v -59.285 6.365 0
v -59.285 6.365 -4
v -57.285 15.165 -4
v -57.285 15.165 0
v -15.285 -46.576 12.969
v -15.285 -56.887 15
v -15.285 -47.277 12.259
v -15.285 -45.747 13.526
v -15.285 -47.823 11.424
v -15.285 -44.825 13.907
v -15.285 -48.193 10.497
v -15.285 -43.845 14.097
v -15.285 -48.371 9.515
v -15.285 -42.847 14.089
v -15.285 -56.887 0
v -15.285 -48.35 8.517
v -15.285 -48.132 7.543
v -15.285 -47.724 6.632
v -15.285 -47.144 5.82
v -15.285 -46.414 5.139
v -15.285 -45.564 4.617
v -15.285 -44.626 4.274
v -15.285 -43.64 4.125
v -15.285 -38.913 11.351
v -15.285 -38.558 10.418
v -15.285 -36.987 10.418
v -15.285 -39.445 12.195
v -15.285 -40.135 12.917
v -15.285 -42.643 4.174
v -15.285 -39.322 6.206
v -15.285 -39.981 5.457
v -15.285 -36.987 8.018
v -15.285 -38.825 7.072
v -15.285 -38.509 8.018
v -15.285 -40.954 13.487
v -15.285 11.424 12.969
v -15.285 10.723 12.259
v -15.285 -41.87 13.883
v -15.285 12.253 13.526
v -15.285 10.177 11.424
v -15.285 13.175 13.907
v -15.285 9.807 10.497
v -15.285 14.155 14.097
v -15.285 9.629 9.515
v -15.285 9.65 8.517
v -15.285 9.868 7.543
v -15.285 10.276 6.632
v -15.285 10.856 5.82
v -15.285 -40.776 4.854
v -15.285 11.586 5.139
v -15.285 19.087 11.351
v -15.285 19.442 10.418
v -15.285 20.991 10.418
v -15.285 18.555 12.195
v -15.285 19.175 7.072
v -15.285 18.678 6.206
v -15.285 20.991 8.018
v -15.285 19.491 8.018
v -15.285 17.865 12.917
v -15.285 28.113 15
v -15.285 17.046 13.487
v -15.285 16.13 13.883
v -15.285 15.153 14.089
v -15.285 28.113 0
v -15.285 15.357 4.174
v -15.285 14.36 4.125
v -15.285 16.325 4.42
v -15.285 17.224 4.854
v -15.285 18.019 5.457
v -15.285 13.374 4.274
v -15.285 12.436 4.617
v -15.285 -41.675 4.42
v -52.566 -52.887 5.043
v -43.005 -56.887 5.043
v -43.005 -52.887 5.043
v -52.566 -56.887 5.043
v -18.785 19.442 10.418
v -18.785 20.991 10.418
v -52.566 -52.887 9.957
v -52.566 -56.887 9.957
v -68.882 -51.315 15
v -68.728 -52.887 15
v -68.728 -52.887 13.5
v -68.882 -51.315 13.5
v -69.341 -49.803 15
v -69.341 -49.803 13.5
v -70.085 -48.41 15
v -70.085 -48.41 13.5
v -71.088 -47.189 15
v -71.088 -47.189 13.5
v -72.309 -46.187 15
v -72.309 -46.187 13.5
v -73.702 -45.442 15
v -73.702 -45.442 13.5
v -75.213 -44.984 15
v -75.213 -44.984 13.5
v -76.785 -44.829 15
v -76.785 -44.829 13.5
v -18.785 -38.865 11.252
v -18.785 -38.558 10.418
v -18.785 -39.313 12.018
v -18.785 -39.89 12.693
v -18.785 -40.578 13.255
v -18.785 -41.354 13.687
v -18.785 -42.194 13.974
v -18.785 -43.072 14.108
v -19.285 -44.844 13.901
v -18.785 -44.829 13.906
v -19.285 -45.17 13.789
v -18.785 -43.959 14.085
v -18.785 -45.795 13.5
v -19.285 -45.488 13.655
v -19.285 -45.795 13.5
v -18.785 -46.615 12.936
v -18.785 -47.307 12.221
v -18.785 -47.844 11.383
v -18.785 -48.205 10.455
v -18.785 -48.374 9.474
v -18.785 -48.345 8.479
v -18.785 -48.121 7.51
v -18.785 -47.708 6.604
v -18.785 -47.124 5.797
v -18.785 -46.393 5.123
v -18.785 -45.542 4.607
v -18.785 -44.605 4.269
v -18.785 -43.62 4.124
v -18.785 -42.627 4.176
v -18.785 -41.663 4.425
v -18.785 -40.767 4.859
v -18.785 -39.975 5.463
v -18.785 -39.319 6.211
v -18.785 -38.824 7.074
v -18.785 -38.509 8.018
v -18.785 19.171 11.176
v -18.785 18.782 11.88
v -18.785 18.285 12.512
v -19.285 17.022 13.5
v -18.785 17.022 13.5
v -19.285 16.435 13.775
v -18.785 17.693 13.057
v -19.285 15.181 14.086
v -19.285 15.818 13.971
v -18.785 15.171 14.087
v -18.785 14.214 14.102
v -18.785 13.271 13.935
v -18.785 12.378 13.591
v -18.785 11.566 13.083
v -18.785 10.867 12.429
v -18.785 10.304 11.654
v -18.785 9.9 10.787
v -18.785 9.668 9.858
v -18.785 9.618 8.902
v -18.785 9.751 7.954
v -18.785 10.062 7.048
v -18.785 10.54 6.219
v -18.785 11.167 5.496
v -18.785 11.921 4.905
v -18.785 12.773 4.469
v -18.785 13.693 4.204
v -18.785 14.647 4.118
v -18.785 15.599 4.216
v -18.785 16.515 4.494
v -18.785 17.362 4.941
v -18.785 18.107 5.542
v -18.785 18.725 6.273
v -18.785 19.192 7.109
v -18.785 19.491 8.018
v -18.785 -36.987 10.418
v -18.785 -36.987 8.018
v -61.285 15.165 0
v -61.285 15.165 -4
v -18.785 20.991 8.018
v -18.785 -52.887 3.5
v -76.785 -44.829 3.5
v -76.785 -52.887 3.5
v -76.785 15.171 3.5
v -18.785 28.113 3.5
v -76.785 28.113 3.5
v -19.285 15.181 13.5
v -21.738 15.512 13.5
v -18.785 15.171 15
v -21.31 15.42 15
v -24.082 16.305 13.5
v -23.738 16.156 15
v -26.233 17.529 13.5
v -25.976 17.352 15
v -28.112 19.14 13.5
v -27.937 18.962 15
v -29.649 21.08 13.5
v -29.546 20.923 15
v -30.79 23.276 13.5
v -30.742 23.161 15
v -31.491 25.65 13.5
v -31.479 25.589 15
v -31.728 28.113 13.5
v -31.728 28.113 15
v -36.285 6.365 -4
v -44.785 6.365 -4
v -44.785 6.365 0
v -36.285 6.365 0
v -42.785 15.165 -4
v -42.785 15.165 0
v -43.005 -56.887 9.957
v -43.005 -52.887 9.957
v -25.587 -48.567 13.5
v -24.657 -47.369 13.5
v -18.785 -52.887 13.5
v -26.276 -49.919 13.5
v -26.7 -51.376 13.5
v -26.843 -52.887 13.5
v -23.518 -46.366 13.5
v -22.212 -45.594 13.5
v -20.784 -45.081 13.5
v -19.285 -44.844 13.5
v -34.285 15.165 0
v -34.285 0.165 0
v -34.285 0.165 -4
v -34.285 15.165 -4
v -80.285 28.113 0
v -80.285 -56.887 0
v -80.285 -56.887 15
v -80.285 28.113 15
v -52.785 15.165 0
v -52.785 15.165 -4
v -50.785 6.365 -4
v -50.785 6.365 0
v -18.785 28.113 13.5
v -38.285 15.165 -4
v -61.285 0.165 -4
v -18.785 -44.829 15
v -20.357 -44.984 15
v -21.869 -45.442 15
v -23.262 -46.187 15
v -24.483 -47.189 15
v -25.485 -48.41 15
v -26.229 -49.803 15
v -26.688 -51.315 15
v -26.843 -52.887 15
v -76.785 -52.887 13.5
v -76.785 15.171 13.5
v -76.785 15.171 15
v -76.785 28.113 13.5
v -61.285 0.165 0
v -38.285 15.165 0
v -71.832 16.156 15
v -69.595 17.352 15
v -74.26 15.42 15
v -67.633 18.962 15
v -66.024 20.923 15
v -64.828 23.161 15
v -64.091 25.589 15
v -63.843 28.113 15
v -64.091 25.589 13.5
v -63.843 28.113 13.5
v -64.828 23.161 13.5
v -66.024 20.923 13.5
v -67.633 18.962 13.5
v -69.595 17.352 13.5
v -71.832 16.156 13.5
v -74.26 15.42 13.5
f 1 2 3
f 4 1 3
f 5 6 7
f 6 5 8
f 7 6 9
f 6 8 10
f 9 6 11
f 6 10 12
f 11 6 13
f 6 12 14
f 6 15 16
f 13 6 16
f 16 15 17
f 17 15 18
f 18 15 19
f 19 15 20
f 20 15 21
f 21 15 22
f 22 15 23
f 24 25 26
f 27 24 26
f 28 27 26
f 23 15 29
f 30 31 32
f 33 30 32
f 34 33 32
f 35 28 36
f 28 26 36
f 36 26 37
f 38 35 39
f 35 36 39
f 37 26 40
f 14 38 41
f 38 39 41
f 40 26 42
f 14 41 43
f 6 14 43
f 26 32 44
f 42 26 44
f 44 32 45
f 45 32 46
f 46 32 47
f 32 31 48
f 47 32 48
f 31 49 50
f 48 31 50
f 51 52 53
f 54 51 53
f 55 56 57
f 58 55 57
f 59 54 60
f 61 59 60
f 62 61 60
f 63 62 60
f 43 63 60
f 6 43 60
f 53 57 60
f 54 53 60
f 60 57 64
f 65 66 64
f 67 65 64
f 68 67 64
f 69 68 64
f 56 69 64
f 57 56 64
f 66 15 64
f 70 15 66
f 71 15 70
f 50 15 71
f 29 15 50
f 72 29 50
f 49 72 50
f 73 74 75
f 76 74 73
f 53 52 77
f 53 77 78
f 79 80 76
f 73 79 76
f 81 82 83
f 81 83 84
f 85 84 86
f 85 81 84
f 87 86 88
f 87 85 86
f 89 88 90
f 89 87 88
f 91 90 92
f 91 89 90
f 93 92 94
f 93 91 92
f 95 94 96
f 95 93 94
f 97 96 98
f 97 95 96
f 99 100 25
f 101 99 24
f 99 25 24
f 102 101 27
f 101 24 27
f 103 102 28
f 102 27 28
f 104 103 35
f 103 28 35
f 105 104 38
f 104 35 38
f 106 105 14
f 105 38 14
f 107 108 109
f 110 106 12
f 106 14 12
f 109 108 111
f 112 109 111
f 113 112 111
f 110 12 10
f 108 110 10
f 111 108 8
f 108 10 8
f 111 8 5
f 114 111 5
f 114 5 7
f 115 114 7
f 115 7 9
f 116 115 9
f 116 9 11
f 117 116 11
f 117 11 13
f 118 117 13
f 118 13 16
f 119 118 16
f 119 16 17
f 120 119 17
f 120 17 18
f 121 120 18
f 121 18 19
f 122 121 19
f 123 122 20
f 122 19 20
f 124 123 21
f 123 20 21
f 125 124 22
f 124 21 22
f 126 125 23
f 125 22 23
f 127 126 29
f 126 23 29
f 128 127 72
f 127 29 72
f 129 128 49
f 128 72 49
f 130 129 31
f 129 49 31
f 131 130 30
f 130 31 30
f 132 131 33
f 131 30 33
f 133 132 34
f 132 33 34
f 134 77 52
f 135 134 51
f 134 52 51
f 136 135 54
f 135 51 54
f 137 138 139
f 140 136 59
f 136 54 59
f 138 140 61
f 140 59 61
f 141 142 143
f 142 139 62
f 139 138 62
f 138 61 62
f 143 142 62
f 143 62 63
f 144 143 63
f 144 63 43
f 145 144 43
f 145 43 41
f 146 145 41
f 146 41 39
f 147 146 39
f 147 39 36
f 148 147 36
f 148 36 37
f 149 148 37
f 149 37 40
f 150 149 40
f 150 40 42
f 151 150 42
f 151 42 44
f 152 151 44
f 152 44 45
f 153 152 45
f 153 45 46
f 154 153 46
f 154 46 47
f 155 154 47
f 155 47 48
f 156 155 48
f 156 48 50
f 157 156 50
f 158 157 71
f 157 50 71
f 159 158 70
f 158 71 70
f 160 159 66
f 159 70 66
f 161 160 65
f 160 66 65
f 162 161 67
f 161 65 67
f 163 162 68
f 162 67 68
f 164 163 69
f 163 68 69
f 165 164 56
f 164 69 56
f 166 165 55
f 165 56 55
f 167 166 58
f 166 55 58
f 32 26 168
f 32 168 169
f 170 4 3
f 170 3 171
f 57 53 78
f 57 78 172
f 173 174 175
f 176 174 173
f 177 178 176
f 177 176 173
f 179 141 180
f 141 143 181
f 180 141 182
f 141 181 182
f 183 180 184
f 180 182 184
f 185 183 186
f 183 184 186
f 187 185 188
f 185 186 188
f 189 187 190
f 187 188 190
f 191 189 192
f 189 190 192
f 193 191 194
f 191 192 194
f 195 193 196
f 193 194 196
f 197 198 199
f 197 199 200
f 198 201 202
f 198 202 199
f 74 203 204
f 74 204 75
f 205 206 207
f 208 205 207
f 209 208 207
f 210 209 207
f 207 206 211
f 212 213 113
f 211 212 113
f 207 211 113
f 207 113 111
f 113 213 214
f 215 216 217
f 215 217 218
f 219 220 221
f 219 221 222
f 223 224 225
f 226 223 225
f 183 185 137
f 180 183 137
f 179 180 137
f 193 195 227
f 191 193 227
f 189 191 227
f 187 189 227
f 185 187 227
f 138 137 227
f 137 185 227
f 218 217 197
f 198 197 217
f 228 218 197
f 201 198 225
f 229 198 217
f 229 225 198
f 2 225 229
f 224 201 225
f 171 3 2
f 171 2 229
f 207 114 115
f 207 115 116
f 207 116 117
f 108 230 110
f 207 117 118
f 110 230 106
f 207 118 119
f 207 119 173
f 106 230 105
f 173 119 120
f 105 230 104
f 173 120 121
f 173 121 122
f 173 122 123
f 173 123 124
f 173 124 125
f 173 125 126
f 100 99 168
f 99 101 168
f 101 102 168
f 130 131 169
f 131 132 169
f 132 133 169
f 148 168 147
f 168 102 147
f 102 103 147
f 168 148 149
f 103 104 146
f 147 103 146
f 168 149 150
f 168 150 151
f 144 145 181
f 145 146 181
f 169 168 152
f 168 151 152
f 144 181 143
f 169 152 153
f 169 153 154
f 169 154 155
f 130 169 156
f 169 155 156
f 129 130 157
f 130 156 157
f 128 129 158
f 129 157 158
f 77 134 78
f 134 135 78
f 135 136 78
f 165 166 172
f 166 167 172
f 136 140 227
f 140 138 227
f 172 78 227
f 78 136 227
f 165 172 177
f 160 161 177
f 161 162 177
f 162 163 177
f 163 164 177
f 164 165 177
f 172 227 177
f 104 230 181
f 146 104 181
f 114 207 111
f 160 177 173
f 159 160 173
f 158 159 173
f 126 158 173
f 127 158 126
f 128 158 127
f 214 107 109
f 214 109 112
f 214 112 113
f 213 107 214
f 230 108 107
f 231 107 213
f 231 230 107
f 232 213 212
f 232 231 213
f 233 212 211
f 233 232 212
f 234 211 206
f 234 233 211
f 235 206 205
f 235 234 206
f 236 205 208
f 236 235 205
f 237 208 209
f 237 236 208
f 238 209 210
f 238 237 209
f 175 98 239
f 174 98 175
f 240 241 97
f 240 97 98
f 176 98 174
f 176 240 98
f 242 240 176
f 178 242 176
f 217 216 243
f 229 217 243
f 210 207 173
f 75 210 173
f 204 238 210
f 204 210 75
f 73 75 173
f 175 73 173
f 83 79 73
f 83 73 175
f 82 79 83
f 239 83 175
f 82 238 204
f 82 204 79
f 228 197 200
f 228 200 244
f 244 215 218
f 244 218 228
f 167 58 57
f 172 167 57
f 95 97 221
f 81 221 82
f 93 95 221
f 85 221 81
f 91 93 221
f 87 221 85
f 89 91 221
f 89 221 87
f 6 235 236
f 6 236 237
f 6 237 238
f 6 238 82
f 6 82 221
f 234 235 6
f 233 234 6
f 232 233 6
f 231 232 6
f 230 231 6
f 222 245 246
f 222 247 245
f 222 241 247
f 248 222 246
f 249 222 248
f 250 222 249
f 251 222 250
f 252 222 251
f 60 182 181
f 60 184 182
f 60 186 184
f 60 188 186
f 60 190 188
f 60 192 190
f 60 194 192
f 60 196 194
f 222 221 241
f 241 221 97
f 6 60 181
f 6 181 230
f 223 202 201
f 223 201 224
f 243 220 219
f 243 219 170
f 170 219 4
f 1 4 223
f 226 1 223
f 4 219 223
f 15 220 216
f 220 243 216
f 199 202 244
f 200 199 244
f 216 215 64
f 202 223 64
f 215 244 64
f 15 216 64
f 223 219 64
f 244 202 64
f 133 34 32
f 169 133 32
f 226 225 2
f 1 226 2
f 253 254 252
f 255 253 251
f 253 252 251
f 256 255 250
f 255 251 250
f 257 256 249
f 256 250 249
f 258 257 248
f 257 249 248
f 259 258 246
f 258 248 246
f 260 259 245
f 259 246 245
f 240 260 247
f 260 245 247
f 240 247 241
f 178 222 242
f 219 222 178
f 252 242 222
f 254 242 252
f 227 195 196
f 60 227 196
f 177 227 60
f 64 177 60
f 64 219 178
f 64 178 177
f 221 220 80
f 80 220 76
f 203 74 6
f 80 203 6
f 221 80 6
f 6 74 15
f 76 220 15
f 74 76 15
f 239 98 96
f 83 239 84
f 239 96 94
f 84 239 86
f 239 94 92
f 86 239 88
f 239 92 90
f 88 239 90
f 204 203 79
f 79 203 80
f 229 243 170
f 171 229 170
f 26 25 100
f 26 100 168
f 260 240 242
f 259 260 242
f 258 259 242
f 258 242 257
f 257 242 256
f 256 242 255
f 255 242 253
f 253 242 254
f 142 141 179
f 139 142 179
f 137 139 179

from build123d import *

# Parameters (mm, degrees)
ESQUISSE1_W             = 65
ESQUISSE1_H             = 85
BOSS_EXTRU_1_DEPTH      = 15
ESQUISSE2_W             = 58
ESQUISSE2_H             = 60
ENL_V_MAT_EXTRU_1_DEPTH = 11.5
ENL_V_MAT_EXTRU_2_DEPTH = 11.5
ESQUISSE5_W             = 12.942434053
ESQUISSE5_H             = 10
ENL_V_MAT_EXTRU_4_DEPTH = 81
ESQUISSE6_W             = 12.942434052
ESQUISSE6_H             = 10
ENL_V_MAT_EXTRU_5_DEPTH = 81
ESQUISSE7_W             = 9.561184164
ESQUISSE7_H             = 4.914624062
ENL_V_MAT_EXTRU_6_DEPTH = 81
ESQUISSE9_W             = 27
ESQUISSE9_H             = 15
BOSS_EXTRU_3_DEPTH      = 4
ENL_V_MAT_EXTRU_8_DEPTH = 4
ESQUISSE13_R            = 5
ESQUISSE13_W            = 2.4
ESQUISSE13_H            = 6.4
ENL_V_MAT_EXTRU_9_DEPTH = 4


with BuildPart() as part:
    # Esquisse1 → Boss.-Extru.1 (new body)
    with BuildSketch(Plane.XY):
        with Locations((-47.785104755, -14.386514523)):
            Rectangle(ESQUISSE1_W, ESQUISSE1_H)
    extrude(amount=BOSS_EXTRU_1_DEPTH)

    # Esquisse2 → Enlèv. mat.-Extru.1 (cut)
    with BuildSketch(Plane.XY.offset(15)):
        with Locations((-47.785104755, -14.828948576)):
            Rectangle(ESQUISSE2_W, ESQUISSE2_H)
    extrude(amount=-ENL_V_MAT_EXTRU_1_DEPTH, mode=Mode.SUBTRACT)

    # Esquisse3 → Enlèv. mat.-Extru.2 (cut)
    with BuildSketch(Plane.XY.offset(15)):
        with BuildLine():
            Line((-31.727538807, 28.113485477), (-63.842670702, 28.113485477))
            ThreePointArc((-63.842670702, 28.113485477), (-67.633421871, 18.961802593), (-76.785104755, 15.171051424))
            Line((-76.785104755, 15.171051424), (-18.785104755, 15.171051424))
            ThreePointArc((-18.785104755, 15.171051424), (-27.936787638, 18.961802593), (-31.727538807, 28.113485477))
        make_face()
        with BuildLine():
            ThreePointArc((-18.785104755, -44.828948576), (-24.482664276, -47.188955002), (-26.842670702, -52.886514523))
            Line((-26.842670702, -52.886514523), (-68.727538807, -52.886514523))
            ThreePointArc((-68.727538807, -52.886514523), (-71.087545234, -47.188955002), (-76.785104755, -44.828948576))
            Line((-76.785104755, -44.828948576), (-18.785104755, -44.828948576))
        make_face()
    extrude(amount=-ENL_V_MAT_EXTRU_2_DEPTH, mode=Mode.SUBTRACT)

    # Esquisse5 → Enlèv. mat.-Extru.4 (cut)
    with BuildSketch(Plane(origin=(0, 28.113485477, 0), x_dir=(1, 0, 0), z_dir=(0, 1, 0))):
        with Locations((-70.313887729, -8.5)):
            Rectangle(ESQUISSE5_W, ESQUISSE5_H)
    extrude(amount=-ENL_V_MAT_EXTRU_4_DEPTH, mode=Mode.SUBTRACT)

    # Esquisse6 → Enlèv. mat.-Extru.5 (cut)
    with BuildSketch(Plane(origin=(0, 28.113485477, 0), x_dir=(1, 0, 0), z_dir=(0, 1, 0))):
        with Locations((-25.256321781, -8.5)):
            Rectangle(ESQUISSE6_W, ESQUISSE6_H)
    extrude(amount=-ENL_V_MAT_EXTRU_5_DEPTH, mode=Mode.SUBTRACT)

    # Esquisse7 → Enlèv. mat.-Extru.6 (cut)
    with BuildSketch(Plane(origin=(0, -56.886514523, 0), x_dir=(-1, 0, 0), z_dir=(0, -1, 0))):
        with Locations((47.785104755, -7.5)):
            Rectangle(ESQUISSE7_W, ESQUISSE7_H)
    extrude(amount=-ENL_V_MAT_EXTRU_6_DEPTH, mode=Mode.SUBTRACT)

    # Esquisse9 → Boss.-Extru.3 (add)
    with BuildSketch(Plane(origin=(0, 0, 0), x_dir=(-1, 0, 0), z_dir=(0, 0, -1))):
        with Locations((47.785104755, 7.665180304)):
            Rectangle(ESQUISSE9_W, ESQUISSE9_H)
    extrude(amount=BOSS_EXTRU_3_DEPTH)

    # Esquisse10 → Enlèv. mat.-Extru.8 (cut)
    with BuildSketch(Plane(origin=(0, 0, -4), x_dir=(-1, 0, 0), z_dir=(0, 0, -1))):
        Polygon((42.785104755, 15.165180304), (44.785104755, 6.365180304), (36.285104755, 6.365180304), (38.285104755, 15.165180304), align=None)
        Polygon((52.785104755, 15.165180304), (50.785104755, 6.365180304), (59.285104755, 6.365180304), (57.285104755, 15.165180304), align=None)
    extrude(amount=-ENL_V_MAT_EXTRU_8_DEPTH, mode=Mode.SUBTRACT)

    # Esquisse13 → Enlèv. mat.-Extru.9 (cut)
    with BuildSketch(Plane(origin=(-15.285104755, 0, 0), x_dir=(0, 0, -1), z_dir=(1, 0, 0))):
        with Locations((-9.118338435, 14.613485477)):
            Circle(ESQUISSE13_R)
        with Locations((-9.118338435, -43.386514523)):
            Circle(ESQUISSE13_R)
        with Locations((-9.218338435, 17.790714068)):
            Rectangle(ESQUISSE13_W, ESQUISSE13_H)
        with Locations((-9.218338435, -40.186514523)):
            Rectangle(ESQUISSE13_W, ESQUISSE13_H)
    extrude(amount=-ENL_V_MAT_EXTRU_9_DEPTH, mode=Mode.SUBTRACT)


solid = part.part
